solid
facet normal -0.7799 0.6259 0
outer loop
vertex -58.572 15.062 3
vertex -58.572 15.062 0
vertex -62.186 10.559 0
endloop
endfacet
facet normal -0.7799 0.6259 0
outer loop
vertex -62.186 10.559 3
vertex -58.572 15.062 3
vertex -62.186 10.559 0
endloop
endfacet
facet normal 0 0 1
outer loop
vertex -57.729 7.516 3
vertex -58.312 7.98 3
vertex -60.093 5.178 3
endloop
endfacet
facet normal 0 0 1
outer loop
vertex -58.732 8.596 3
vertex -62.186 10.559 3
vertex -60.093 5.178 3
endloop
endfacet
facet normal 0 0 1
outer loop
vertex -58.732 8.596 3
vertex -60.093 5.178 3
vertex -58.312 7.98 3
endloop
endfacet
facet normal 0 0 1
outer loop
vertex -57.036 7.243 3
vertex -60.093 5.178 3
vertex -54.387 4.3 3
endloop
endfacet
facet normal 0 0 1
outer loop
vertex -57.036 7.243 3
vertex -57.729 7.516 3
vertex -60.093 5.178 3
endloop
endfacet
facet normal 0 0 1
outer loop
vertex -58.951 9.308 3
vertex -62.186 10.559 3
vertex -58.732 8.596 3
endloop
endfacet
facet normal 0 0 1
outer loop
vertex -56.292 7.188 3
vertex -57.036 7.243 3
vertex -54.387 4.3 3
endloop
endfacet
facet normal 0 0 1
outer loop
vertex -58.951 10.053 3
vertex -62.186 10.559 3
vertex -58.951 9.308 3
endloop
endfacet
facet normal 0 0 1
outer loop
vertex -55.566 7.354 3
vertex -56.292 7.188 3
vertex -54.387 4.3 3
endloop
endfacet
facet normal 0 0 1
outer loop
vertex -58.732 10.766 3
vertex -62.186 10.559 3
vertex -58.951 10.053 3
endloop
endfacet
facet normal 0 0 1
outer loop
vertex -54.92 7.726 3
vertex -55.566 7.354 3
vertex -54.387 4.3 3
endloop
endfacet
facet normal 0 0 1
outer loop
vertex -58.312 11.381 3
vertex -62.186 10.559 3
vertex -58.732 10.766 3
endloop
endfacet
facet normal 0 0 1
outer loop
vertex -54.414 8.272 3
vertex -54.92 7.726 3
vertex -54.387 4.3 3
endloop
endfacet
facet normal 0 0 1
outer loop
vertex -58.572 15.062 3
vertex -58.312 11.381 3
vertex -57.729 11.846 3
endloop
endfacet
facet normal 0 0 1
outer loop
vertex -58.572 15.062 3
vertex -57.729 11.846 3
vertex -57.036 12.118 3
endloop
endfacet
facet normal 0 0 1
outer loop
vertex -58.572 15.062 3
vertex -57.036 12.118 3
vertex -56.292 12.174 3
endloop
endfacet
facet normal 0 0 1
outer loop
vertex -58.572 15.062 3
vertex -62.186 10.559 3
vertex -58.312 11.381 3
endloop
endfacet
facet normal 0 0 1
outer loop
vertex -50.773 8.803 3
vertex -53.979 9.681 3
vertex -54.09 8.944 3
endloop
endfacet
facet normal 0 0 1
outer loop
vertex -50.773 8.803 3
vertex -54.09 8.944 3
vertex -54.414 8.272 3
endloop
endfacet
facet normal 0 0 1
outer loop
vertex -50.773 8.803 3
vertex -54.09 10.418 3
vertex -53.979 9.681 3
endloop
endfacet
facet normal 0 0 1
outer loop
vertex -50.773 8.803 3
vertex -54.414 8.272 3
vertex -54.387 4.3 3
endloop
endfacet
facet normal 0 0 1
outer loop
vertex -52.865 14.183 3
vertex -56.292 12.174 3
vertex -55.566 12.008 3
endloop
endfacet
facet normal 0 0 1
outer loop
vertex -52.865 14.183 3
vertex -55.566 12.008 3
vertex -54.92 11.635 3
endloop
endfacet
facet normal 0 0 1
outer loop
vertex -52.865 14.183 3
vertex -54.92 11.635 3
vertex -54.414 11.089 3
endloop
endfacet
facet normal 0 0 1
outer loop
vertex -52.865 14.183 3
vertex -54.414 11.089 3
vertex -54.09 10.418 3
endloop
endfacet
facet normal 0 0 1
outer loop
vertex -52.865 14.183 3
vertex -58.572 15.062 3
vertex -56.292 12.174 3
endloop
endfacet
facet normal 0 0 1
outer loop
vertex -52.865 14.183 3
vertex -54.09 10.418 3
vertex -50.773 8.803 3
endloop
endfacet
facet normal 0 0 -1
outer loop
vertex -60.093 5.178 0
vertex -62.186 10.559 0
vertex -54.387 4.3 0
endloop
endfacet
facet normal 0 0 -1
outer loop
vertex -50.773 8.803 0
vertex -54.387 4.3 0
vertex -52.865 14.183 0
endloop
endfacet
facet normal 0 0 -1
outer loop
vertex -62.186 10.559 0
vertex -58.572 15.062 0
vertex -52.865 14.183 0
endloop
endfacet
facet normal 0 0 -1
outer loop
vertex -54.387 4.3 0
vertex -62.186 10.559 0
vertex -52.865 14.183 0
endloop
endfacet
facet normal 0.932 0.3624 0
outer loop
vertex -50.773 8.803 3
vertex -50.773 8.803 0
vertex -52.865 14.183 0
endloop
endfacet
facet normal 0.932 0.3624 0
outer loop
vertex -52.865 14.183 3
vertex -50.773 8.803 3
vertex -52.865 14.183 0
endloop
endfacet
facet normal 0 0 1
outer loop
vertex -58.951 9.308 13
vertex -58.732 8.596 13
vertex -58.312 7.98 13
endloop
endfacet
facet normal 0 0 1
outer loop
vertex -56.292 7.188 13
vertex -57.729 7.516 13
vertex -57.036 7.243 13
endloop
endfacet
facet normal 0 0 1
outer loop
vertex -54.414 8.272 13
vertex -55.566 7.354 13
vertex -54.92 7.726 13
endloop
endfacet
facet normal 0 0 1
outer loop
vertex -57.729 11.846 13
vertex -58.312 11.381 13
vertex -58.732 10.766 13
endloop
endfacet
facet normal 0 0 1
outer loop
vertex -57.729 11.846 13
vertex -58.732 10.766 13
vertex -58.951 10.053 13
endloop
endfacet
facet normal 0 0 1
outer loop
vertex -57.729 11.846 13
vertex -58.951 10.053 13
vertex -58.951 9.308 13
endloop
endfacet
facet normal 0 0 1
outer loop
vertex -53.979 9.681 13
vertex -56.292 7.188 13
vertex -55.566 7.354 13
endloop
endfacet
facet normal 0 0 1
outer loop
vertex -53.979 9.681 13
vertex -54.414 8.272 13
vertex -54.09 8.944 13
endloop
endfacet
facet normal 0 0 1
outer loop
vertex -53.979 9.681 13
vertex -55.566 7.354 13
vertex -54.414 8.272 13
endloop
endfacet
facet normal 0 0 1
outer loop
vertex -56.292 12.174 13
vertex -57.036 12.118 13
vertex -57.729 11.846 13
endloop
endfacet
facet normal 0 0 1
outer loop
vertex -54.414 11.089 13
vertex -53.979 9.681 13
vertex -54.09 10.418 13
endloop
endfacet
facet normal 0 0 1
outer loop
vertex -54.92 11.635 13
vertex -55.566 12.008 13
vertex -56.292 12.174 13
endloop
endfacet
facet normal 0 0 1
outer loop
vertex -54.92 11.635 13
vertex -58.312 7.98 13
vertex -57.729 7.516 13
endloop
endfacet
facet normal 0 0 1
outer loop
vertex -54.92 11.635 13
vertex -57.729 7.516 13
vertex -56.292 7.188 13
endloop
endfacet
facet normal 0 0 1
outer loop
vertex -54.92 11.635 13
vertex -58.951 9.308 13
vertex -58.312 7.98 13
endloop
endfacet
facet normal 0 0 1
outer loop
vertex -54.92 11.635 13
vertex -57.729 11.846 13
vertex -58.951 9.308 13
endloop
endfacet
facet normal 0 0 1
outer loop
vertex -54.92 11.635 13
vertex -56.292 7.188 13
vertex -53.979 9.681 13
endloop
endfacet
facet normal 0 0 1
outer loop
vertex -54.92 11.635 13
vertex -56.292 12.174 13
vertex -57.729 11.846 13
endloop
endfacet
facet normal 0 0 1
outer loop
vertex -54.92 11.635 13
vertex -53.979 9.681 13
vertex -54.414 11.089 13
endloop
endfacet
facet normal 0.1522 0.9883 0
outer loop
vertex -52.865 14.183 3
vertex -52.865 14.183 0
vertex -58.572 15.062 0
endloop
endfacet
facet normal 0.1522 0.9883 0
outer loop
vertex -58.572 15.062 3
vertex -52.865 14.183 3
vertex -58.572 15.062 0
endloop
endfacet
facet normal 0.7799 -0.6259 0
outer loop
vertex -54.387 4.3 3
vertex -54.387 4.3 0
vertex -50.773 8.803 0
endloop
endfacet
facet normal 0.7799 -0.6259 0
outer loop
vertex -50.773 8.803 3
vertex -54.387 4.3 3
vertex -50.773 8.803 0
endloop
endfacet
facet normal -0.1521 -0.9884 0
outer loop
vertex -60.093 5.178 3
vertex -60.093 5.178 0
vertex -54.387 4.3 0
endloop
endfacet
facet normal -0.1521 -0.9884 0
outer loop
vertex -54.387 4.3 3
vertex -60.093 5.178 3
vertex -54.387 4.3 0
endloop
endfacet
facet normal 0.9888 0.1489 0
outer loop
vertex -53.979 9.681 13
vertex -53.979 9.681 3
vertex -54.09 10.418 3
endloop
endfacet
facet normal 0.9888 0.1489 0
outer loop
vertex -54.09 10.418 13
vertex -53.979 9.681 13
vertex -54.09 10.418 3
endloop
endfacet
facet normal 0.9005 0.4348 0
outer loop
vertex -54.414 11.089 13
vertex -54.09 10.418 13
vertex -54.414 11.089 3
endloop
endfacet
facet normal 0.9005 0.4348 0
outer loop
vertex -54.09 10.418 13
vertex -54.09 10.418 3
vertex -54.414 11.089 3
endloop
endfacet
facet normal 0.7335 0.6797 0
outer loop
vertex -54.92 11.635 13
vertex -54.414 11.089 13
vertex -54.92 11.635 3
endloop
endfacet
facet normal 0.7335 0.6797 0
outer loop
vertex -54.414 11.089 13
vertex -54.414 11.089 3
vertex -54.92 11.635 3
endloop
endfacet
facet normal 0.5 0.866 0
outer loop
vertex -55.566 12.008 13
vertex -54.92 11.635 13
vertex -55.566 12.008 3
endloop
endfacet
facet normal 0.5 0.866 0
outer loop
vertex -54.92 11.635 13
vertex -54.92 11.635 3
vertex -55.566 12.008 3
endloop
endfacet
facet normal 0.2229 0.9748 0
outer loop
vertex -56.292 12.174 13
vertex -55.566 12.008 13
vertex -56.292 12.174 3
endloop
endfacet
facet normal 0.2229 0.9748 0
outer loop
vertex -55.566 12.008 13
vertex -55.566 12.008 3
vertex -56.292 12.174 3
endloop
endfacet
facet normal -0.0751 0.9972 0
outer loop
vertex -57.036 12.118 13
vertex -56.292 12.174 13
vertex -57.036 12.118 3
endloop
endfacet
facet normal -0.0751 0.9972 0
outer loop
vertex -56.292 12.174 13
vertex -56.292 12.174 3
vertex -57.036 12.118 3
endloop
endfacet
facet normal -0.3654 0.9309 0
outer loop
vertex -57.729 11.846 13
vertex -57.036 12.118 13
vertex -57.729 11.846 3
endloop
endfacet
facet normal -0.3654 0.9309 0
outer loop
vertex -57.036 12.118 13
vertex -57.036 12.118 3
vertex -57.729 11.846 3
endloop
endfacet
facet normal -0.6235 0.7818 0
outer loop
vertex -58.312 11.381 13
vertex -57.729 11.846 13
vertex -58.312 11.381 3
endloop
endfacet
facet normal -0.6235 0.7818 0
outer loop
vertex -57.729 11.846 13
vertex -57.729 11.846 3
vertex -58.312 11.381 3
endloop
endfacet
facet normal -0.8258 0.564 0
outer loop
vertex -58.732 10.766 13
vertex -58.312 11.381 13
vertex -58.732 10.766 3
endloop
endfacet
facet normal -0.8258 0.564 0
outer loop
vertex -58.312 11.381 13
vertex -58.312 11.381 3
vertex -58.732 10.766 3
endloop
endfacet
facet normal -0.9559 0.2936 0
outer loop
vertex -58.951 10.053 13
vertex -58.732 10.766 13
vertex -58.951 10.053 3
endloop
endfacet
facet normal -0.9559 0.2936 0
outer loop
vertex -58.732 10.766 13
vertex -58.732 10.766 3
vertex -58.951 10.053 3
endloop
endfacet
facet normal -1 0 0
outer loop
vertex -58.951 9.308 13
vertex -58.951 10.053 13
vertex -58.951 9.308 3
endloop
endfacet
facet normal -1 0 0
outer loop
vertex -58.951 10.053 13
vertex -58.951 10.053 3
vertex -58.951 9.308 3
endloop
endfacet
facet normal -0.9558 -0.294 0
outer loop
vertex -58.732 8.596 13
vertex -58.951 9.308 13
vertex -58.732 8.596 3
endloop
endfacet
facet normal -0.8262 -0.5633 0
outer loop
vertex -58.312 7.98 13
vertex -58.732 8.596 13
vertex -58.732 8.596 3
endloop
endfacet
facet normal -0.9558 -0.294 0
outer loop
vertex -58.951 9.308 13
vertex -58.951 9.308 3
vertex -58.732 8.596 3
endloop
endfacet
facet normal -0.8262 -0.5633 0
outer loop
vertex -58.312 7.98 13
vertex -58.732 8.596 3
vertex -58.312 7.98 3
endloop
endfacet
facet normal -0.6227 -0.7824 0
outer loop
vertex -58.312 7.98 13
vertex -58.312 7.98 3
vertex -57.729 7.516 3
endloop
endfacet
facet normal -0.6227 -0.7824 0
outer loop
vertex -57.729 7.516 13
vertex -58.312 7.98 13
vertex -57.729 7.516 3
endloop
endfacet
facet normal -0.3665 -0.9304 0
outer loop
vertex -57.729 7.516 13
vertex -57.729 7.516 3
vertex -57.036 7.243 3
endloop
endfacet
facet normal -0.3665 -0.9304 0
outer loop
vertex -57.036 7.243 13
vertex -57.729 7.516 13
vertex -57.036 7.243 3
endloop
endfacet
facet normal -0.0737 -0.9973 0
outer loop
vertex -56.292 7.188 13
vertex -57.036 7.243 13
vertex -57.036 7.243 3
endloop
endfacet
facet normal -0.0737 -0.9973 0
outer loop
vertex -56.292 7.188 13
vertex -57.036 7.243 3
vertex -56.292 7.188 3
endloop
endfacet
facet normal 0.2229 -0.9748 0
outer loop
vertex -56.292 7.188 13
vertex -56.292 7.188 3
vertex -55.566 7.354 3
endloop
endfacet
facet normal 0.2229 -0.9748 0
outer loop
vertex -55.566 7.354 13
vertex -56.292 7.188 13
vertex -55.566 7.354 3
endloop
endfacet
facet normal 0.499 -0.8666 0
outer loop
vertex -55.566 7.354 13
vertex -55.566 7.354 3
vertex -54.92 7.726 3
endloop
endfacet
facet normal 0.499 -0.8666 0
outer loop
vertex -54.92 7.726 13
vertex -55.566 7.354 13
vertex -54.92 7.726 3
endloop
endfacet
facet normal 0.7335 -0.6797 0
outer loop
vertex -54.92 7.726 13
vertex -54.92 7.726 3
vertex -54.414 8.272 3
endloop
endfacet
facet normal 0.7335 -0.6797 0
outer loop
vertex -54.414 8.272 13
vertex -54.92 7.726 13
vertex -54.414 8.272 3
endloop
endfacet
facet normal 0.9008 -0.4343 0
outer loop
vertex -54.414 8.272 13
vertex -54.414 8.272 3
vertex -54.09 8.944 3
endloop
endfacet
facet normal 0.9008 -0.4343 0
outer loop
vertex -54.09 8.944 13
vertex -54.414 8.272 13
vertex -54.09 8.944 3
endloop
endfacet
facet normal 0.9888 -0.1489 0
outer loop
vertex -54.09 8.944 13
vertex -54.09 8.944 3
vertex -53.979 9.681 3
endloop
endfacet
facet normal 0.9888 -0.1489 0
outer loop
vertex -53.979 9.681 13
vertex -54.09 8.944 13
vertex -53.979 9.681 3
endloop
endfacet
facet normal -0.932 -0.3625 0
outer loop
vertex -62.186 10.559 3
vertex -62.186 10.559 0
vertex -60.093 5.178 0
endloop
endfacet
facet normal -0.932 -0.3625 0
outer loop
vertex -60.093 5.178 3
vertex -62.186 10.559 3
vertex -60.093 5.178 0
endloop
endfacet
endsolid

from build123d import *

# Parameters (mm, degrees)
SALIENTE_EXTRUIR3_DEPTH = 3
CROQUIS3_R              = 2.5
SALIENTE_EXTRUIR4_DEPTH = 13


with BuildPart() as part:
    # Croquis1 → Saliente-Extruir3 (new body)
    with BuildSketch(Plane.XY):
        Polygon((-54.386636348, 4.299863782), (-50.772905222, 8.802560828), (-52.865489687, 14.183492308), (-58.571805277, 15.061726742), (-62.185536402, 10.559029696), (-60.092951938, 5.178098216), align=None)
    extrude(amount=SALIENTE_EXTRUIR3_DEPTH)

    # Croquis3 → Saliente-Extruir4 (add)
    with BuildSketch(Plane.XY):
        with Locations((-56.479220812, 9.680795262)):
            Circle(CROQUIS3_R)
    extrude(amount=SALIENTE_EXTRUIR4_DEPTH)


solid = part.part
